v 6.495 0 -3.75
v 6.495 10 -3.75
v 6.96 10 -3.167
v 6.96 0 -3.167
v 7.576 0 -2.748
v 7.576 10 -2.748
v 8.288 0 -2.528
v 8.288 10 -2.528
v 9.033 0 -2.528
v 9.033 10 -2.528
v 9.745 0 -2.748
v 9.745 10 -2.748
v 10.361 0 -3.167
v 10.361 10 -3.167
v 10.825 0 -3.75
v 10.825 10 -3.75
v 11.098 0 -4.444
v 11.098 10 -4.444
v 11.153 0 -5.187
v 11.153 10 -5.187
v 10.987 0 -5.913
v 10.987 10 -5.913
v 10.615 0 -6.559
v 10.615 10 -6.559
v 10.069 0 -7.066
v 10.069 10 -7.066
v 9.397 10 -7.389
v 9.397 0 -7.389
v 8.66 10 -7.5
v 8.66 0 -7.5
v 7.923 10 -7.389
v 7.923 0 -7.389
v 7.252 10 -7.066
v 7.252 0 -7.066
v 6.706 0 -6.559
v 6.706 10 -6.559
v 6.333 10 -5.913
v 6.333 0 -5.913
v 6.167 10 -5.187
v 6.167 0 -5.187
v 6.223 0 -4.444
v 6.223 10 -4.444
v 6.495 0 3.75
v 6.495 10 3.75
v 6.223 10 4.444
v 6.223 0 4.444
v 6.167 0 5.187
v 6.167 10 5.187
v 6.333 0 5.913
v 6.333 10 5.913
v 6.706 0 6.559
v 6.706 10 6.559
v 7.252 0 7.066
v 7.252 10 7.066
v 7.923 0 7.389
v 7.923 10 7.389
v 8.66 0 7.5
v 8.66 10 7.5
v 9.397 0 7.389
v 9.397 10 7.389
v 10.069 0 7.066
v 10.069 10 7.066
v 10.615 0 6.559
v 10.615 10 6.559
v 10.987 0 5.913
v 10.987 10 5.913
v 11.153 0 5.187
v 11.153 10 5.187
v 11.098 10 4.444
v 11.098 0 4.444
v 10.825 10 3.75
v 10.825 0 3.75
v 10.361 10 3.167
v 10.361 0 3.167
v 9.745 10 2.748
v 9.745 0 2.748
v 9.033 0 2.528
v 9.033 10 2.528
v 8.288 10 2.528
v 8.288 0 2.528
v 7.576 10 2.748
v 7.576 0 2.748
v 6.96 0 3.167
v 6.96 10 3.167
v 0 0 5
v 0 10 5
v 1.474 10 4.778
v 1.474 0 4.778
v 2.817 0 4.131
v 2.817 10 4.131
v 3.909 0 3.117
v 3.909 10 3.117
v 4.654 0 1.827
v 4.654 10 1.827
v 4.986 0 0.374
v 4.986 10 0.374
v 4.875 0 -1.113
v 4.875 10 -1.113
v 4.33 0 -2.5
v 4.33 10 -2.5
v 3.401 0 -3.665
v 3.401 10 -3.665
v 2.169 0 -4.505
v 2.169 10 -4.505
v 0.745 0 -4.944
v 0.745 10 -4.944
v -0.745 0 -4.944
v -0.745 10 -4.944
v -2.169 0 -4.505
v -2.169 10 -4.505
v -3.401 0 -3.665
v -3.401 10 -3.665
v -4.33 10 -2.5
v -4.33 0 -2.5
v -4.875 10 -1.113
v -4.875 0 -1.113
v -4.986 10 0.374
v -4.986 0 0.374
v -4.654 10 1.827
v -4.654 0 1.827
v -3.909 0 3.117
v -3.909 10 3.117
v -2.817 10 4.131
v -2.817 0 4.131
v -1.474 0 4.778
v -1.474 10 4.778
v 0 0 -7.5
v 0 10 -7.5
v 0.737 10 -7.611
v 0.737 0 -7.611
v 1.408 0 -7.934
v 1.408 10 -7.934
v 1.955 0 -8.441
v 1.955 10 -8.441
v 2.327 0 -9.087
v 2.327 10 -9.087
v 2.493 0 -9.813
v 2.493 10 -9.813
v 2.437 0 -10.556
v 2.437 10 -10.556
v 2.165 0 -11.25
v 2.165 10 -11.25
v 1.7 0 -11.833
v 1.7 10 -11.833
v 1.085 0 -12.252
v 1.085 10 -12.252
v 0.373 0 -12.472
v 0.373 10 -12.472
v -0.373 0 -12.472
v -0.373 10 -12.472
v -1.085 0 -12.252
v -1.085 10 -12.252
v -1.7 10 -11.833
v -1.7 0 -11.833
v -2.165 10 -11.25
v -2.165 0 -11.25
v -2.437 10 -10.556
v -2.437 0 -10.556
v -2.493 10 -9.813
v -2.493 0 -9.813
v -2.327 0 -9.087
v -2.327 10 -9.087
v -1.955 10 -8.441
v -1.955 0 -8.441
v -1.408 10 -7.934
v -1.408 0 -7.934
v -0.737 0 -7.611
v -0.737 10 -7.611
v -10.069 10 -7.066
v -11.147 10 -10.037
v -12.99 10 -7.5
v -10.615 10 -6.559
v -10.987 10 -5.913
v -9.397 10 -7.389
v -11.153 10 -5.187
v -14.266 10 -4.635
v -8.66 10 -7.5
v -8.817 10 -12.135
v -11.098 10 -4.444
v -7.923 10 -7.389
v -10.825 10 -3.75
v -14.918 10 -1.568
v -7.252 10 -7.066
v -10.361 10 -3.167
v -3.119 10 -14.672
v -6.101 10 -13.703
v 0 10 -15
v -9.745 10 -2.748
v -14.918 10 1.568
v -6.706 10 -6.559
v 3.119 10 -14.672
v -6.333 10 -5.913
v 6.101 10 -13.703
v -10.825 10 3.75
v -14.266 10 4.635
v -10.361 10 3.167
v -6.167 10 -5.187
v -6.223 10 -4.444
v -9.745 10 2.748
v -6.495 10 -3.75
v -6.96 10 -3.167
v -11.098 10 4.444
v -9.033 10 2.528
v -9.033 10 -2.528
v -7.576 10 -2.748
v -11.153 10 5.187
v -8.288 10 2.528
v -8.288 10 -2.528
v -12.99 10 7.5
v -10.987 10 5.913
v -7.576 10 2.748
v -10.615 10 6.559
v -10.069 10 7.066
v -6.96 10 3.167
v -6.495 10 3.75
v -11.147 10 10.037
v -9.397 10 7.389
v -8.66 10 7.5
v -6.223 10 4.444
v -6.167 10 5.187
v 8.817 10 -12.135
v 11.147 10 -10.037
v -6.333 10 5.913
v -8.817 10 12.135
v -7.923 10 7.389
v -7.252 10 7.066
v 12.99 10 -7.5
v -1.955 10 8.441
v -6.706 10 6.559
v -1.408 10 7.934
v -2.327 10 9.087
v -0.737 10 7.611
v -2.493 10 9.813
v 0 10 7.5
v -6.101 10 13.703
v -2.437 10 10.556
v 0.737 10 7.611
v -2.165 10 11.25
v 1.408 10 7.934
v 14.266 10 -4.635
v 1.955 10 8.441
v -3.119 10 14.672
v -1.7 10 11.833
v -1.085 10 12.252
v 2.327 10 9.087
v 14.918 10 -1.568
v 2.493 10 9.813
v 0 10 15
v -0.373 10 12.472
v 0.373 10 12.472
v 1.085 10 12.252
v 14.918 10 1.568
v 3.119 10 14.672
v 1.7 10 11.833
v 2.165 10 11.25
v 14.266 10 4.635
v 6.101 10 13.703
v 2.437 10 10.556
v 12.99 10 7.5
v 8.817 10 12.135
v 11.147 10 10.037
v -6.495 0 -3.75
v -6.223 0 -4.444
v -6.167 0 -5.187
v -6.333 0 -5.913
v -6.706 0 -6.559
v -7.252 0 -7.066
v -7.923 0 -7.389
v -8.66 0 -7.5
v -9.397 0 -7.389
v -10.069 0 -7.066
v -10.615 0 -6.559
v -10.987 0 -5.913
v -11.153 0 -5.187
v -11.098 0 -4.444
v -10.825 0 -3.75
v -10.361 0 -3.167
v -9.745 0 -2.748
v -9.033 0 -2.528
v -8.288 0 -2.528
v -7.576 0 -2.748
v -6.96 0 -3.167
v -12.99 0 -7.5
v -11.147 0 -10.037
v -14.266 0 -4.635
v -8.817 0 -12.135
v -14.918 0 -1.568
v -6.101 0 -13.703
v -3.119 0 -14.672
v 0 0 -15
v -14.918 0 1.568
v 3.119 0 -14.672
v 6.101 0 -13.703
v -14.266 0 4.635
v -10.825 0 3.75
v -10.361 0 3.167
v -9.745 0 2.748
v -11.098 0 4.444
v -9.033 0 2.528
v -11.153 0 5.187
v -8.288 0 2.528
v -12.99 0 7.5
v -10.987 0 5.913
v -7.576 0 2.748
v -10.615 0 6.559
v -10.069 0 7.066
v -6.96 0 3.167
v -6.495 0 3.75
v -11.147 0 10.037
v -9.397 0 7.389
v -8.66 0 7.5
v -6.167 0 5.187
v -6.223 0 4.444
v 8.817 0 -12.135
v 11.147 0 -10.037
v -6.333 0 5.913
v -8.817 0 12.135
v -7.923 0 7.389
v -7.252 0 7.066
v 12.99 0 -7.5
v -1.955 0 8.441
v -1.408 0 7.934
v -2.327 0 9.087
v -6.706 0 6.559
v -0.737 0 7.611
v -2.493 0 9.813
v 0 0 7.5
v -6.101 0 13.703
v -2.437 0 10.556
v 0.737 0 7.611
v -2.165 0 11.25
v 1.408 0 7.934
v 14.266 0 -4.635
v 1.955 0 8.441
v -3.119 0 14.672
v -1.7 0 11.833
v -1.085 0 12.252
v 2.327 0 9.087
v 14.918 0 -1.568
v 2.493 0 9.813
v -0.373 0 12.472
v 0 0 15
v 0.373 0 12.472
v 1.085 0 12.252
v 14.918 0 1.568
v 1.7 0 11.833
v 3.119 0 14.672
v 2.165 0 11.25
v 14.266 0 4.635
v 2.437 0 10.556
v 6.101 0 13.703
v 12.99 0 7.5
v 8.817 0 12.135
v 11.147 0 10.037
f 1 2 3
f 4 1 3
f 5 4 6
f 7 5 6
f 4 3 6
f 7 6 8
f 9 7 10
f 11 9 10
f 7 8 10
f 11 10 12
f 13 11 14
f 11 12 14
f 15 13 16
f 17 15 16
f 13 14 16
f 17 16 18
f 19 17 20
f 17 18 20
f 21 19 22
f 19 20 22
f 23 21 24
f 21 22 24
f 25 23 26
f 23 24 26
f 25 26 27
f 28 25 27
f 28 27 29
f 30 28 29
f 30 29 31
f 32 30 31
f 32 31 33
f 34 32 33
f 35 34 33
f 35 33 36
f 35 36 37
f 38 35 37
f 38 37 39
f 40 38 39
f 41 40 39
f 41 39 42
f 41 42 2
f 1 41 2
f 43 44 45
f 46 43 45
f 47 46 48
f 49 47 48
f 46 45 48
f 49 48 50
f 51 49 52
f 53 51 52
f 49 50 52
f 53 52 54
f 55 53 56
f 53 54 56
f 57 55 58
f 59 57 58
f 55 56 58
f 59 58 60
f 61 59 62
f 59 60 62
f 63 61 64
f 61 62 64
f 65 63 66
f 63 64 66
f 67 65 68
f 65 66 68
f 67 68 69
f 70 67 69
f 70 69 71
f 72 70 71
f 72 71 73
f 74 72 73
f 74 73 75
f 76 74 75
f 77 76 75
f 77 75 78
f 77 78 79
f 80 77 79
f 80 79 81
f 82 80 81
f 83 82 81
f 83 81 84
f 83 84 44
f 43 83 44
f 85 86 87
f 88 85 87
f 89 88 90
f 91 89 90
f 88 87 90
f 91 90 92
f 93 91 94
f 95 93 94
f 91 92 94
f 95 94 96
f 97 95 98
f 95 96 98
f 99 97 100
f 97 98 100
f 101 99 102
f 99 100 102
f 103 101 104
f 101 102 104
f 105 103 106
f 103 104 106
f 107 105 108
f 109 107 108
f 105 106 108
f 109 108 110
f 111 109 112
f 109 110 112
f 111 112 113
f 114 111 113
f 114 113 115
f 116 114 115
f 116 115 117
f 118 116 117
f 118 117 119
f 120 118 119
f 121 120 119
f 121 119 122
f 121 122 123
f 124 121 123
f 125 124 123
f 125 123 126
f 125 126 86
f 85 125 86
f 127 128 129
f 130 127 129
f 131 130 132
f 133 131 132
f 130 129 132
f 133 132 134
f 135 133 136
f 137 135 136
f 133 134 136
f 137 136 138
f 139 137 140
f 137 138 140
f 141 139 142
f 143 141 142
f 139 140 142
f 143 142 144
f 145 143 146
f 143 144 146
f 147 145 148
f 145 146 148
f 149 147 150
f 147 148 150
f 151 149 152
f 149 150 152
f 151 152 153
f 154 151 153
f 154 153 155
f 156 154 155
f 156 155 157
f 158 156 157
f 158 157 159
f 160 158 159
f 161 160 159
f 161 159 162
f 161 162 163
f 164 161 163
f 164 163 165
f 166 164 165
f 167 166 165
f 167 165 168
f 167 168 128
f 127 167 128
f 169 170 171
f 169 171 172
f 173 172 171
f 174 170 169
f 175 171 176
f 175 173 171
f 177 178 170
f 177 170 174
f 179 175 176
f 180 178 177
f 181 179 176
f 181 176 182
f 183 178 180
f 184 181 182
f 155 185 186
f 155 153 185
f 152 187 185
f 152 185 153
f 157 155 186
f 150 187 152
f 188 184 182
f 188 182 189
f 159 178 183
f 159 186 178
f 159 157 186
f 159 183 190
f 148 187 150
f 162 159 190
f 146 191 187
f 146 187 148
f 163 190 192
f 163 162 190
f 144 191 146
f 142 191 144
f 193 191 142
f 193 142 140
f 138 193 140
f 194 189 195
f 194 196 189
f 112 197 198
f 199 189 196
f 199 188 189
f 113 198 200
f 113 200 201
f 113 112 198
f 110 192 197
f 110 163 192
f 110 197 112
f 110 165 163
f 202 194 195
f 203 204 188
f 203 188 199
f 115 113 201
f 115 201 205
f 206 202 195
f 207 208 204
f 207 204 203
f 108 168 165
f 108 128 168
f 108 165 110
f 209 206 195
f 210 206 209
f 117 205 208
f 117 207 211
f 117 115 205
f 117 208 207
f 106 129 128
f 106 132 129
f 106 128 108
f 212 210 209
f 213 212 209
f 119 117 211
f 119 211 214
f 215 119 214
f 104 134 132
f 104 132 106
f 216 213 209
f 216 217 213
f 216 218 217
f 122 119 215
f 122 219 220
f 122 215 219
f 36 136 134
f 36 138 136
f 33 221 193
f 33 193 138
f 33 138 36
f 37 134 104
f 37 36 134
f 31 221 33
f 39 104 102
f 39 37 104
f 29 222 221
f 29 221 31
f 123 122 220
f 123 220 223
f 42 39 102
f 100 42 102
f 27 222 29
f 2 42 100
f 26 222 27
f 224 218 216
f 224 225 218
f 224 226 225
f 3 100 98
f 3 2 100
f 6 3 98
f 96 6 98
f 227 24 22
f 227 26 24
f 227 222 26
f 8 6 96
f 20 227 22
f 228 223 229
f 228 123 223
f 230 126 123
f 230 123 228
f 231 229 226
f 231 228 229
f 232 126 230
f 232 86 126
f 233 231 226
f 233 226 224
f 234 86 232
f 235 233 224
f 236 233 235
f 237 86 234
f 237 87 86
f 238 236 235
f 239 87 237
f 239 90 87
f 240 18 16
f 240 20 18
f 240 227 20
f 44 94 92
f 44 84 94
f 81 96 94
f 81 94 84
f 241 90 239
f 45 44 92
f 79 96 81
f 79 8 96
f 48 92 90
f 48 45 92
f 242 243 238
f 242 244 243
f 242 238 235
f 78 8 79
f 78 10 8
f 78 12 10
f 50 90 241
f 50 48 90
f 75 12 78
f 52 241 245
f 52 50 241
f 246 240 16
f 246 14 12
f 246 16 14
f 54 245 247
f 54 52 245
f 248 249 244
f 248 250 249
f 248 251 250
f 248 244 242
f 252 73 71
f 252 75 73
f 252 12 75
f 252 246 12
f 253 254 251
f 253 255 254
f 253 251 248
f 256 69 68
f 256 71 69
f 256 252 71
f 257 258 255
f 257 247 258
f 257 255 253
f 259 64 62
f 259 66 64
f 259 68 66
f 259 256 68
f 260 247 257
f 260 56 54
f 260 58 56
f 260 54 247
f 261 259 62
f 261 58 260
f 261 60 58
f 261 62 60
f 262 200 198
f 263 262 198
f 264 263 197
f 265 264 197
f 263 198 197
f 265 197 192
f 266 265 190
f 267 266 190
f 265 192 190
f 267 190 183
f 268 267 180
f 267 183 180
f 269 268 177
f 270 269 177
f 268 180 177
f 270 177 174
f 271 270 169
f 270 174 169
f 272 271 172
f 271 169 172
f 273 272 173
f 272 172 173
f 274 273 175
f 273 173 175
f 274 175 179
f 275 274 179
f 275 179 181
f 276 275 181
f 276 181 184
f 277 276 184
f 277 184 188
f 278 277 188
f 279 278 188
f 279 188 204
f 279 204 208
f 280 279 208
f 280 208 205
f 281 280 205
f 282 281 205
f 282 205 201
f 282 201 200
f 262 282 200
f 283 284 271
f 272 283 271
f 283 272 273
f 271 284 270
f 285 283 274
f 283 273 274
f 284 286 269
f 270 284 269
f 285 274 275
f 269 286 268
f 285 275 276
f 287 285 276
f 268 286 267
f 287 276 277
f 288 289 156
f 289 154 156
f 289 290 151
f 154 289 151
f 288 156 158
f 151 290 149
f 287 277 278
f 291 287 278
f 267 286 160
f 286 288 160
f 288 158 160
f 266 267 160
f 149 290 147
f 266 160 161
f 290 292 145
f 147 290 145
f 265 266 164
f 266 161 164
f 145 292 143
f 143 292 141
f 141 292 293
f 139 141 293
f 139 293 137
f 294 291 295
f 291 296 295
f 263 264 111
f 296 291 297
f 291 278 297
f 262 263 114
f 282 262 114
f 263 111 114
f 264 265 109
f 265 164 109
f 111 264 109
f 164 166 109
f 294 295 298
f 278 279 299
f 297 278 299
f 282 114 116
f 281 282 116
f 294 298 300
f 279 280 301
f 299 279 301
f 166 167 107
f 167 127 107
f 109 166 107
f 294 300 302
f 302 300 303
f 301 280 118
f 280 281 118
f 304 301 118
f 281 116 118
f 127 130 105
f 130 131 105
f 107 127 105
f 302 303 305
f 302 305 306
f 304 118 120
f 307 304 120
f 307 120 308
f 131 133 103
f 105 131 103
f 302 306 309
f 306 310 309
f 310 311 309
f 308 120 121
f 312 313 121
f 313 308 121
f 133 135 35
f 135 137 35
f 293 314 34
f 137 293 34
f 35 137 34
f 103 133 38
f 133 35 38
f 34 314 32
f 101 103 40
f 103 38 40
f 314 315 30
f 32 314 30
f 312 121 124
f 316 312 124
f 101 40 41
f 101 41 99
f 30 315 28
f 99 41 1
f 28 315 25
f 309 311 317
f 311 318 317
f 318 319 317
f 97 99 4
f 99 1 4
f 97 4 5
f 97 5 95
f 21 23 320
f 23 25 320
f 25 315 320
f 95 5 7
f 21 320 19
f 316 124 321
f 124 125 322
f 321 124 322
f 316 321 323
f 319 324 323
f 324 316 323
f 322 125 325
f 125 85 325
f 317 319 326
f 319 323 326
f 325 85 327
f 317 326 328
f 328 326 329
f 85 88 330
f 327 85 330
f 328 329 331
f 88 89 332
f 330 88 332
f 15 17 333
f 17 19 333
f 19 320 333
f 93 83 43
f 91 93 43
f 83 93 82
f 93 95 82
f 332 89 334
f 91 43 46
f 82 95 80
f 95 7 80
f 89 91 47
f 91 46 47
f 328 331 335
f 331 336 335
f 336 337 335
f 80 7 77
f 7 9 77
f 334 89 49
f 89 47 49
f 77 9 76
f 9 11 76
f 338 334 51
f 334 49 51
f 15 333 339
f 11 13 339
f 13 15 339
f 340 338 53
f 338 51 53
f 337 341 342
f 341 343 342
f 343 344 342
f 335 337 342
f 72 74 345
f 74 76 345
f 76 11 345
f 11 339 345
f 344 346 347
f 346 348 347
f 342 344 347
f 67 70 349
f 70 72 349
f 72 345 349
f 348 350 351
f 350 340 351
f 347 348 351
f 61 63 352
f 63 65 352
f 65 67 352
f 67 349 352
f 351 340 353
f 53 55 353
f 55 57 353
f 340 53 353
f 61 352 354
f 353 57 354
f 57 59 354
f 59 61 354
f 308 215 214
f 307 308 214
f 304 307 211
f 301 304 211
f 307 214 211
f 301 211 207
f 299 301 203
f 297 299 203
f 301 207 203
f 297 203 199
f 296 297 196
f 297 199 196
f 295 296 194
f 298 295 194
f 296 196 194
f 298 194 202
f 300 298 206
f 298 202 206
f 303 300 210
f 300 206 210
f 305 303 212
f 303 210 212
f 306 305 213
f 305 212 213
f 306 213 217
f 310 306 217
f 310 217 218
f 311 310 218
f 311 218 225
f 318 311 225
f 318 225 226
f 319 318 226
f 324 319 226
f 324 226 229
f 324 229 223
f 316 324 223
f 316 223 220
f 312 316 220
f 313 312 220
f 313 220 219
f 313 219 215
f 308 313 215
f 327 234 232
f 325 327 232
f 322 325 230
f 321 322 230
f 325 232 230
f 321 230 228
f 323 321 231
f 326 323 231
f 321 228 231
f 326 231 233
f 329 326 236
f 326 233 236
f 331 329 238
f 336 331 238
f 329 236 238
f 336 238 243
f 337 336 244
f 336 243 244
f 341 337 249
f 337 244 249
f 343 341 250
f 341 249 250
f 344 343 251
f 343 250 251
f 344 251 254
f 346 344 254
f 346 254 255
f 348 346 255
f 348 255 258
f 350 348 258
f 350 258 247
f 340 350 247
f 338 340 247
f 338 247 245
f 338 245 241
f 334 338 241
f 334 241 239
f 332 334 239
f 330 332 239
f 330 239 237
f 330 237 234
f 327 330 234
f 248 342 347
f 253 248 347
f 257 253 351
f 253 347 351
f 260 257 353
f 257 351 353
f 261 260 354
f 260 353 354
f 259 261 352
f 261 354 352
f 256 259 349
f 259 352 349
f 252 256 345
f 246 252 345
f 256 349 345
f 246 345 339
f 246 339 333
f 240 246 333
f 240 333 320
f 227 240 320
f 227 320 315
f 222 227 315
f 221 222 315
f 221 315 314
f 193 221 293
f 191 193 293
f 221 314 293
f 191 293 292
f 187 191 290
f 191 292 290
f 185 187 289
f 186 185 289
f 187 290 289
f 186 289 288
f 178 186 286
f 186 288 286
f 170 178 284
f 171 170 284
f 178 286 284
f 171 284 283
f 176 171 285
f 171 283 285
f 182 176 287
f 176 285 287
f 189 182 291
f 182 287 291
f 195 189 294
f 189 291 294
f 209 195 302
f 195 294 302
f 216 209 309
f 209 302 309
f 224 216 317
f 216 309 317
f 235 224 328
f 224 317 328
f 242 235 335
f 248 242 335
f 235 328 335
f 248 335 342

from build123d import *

# Parameters (mm, degrees)
SKETCH1_R           = 15
BOSS_EXTRUDE1_DEPTH = 10
SKETCH2_R           = 5
CUT_EXTRUDE1_DEPTH  = 24.452078799
SKETCH3_R           = 2.5
CUT_EXTRUDE2_DEPTH  = 24.452078799
CIRPATTERN1_COUNT   = 6


with BuildPart() as part:
    # Sketch1 → Boss-Extrude1 (new body)
    with BuildSketch(Plane(origin=(0, 0, 0), x_dir=(1, 0, 0), z_dir=(0, 1, 0))):
        with Locations(Location((0, 0, 0), (0, 0, 270))):
            Circle(SKETCH1_R)
    extrude(amount=BOSS_EXTRUDE1_DEPTH)

    # Sketch2 → Cut-Extrude1 (cut, through all)
    with BuildSketch(Plane(origin=(0, 10, 0), x_dir=(1, 0, 0), z_dir=(0, 1, 0))):
        with Locations(Location((0, 0, 0), (0, 0, 270))):
            Circle(SKETCH2_R)
    extrude(amount=-CUT_EXTRUDE1_DEPTH, mode=Mode.SUBTRACT)

    # Sketch3 → Cut-Extrude2 (cut, through all)
    with BuildSketch(Plane(origin=(0, 10, 0), x_dir=(1, 0, 0), z_dir=(0, 1, 0))):
        with Locations(Location((0, 10, 0), (0, 0, 270))):
            Circle(SKETCH3_R)
    cut_extrude2 = extrude(amount=-CUT_EXTRUDE2_DEPTH, mode=Mode.SUBTRACT)

    # CirPattern1: Cut-Extrude2 ×6 about axis
    cirpattern1_axis = Axis((0, 0, 0), (0, 1, 0))
    for i in range(1, CIRPATTERN1_COUNT):
        add(cut_extrude2.rotate(cirpattern1_axis, i * 360 / CIRPATTERN1_COUNT), mode=Mode.SUBTRACT)


solid = part.part
